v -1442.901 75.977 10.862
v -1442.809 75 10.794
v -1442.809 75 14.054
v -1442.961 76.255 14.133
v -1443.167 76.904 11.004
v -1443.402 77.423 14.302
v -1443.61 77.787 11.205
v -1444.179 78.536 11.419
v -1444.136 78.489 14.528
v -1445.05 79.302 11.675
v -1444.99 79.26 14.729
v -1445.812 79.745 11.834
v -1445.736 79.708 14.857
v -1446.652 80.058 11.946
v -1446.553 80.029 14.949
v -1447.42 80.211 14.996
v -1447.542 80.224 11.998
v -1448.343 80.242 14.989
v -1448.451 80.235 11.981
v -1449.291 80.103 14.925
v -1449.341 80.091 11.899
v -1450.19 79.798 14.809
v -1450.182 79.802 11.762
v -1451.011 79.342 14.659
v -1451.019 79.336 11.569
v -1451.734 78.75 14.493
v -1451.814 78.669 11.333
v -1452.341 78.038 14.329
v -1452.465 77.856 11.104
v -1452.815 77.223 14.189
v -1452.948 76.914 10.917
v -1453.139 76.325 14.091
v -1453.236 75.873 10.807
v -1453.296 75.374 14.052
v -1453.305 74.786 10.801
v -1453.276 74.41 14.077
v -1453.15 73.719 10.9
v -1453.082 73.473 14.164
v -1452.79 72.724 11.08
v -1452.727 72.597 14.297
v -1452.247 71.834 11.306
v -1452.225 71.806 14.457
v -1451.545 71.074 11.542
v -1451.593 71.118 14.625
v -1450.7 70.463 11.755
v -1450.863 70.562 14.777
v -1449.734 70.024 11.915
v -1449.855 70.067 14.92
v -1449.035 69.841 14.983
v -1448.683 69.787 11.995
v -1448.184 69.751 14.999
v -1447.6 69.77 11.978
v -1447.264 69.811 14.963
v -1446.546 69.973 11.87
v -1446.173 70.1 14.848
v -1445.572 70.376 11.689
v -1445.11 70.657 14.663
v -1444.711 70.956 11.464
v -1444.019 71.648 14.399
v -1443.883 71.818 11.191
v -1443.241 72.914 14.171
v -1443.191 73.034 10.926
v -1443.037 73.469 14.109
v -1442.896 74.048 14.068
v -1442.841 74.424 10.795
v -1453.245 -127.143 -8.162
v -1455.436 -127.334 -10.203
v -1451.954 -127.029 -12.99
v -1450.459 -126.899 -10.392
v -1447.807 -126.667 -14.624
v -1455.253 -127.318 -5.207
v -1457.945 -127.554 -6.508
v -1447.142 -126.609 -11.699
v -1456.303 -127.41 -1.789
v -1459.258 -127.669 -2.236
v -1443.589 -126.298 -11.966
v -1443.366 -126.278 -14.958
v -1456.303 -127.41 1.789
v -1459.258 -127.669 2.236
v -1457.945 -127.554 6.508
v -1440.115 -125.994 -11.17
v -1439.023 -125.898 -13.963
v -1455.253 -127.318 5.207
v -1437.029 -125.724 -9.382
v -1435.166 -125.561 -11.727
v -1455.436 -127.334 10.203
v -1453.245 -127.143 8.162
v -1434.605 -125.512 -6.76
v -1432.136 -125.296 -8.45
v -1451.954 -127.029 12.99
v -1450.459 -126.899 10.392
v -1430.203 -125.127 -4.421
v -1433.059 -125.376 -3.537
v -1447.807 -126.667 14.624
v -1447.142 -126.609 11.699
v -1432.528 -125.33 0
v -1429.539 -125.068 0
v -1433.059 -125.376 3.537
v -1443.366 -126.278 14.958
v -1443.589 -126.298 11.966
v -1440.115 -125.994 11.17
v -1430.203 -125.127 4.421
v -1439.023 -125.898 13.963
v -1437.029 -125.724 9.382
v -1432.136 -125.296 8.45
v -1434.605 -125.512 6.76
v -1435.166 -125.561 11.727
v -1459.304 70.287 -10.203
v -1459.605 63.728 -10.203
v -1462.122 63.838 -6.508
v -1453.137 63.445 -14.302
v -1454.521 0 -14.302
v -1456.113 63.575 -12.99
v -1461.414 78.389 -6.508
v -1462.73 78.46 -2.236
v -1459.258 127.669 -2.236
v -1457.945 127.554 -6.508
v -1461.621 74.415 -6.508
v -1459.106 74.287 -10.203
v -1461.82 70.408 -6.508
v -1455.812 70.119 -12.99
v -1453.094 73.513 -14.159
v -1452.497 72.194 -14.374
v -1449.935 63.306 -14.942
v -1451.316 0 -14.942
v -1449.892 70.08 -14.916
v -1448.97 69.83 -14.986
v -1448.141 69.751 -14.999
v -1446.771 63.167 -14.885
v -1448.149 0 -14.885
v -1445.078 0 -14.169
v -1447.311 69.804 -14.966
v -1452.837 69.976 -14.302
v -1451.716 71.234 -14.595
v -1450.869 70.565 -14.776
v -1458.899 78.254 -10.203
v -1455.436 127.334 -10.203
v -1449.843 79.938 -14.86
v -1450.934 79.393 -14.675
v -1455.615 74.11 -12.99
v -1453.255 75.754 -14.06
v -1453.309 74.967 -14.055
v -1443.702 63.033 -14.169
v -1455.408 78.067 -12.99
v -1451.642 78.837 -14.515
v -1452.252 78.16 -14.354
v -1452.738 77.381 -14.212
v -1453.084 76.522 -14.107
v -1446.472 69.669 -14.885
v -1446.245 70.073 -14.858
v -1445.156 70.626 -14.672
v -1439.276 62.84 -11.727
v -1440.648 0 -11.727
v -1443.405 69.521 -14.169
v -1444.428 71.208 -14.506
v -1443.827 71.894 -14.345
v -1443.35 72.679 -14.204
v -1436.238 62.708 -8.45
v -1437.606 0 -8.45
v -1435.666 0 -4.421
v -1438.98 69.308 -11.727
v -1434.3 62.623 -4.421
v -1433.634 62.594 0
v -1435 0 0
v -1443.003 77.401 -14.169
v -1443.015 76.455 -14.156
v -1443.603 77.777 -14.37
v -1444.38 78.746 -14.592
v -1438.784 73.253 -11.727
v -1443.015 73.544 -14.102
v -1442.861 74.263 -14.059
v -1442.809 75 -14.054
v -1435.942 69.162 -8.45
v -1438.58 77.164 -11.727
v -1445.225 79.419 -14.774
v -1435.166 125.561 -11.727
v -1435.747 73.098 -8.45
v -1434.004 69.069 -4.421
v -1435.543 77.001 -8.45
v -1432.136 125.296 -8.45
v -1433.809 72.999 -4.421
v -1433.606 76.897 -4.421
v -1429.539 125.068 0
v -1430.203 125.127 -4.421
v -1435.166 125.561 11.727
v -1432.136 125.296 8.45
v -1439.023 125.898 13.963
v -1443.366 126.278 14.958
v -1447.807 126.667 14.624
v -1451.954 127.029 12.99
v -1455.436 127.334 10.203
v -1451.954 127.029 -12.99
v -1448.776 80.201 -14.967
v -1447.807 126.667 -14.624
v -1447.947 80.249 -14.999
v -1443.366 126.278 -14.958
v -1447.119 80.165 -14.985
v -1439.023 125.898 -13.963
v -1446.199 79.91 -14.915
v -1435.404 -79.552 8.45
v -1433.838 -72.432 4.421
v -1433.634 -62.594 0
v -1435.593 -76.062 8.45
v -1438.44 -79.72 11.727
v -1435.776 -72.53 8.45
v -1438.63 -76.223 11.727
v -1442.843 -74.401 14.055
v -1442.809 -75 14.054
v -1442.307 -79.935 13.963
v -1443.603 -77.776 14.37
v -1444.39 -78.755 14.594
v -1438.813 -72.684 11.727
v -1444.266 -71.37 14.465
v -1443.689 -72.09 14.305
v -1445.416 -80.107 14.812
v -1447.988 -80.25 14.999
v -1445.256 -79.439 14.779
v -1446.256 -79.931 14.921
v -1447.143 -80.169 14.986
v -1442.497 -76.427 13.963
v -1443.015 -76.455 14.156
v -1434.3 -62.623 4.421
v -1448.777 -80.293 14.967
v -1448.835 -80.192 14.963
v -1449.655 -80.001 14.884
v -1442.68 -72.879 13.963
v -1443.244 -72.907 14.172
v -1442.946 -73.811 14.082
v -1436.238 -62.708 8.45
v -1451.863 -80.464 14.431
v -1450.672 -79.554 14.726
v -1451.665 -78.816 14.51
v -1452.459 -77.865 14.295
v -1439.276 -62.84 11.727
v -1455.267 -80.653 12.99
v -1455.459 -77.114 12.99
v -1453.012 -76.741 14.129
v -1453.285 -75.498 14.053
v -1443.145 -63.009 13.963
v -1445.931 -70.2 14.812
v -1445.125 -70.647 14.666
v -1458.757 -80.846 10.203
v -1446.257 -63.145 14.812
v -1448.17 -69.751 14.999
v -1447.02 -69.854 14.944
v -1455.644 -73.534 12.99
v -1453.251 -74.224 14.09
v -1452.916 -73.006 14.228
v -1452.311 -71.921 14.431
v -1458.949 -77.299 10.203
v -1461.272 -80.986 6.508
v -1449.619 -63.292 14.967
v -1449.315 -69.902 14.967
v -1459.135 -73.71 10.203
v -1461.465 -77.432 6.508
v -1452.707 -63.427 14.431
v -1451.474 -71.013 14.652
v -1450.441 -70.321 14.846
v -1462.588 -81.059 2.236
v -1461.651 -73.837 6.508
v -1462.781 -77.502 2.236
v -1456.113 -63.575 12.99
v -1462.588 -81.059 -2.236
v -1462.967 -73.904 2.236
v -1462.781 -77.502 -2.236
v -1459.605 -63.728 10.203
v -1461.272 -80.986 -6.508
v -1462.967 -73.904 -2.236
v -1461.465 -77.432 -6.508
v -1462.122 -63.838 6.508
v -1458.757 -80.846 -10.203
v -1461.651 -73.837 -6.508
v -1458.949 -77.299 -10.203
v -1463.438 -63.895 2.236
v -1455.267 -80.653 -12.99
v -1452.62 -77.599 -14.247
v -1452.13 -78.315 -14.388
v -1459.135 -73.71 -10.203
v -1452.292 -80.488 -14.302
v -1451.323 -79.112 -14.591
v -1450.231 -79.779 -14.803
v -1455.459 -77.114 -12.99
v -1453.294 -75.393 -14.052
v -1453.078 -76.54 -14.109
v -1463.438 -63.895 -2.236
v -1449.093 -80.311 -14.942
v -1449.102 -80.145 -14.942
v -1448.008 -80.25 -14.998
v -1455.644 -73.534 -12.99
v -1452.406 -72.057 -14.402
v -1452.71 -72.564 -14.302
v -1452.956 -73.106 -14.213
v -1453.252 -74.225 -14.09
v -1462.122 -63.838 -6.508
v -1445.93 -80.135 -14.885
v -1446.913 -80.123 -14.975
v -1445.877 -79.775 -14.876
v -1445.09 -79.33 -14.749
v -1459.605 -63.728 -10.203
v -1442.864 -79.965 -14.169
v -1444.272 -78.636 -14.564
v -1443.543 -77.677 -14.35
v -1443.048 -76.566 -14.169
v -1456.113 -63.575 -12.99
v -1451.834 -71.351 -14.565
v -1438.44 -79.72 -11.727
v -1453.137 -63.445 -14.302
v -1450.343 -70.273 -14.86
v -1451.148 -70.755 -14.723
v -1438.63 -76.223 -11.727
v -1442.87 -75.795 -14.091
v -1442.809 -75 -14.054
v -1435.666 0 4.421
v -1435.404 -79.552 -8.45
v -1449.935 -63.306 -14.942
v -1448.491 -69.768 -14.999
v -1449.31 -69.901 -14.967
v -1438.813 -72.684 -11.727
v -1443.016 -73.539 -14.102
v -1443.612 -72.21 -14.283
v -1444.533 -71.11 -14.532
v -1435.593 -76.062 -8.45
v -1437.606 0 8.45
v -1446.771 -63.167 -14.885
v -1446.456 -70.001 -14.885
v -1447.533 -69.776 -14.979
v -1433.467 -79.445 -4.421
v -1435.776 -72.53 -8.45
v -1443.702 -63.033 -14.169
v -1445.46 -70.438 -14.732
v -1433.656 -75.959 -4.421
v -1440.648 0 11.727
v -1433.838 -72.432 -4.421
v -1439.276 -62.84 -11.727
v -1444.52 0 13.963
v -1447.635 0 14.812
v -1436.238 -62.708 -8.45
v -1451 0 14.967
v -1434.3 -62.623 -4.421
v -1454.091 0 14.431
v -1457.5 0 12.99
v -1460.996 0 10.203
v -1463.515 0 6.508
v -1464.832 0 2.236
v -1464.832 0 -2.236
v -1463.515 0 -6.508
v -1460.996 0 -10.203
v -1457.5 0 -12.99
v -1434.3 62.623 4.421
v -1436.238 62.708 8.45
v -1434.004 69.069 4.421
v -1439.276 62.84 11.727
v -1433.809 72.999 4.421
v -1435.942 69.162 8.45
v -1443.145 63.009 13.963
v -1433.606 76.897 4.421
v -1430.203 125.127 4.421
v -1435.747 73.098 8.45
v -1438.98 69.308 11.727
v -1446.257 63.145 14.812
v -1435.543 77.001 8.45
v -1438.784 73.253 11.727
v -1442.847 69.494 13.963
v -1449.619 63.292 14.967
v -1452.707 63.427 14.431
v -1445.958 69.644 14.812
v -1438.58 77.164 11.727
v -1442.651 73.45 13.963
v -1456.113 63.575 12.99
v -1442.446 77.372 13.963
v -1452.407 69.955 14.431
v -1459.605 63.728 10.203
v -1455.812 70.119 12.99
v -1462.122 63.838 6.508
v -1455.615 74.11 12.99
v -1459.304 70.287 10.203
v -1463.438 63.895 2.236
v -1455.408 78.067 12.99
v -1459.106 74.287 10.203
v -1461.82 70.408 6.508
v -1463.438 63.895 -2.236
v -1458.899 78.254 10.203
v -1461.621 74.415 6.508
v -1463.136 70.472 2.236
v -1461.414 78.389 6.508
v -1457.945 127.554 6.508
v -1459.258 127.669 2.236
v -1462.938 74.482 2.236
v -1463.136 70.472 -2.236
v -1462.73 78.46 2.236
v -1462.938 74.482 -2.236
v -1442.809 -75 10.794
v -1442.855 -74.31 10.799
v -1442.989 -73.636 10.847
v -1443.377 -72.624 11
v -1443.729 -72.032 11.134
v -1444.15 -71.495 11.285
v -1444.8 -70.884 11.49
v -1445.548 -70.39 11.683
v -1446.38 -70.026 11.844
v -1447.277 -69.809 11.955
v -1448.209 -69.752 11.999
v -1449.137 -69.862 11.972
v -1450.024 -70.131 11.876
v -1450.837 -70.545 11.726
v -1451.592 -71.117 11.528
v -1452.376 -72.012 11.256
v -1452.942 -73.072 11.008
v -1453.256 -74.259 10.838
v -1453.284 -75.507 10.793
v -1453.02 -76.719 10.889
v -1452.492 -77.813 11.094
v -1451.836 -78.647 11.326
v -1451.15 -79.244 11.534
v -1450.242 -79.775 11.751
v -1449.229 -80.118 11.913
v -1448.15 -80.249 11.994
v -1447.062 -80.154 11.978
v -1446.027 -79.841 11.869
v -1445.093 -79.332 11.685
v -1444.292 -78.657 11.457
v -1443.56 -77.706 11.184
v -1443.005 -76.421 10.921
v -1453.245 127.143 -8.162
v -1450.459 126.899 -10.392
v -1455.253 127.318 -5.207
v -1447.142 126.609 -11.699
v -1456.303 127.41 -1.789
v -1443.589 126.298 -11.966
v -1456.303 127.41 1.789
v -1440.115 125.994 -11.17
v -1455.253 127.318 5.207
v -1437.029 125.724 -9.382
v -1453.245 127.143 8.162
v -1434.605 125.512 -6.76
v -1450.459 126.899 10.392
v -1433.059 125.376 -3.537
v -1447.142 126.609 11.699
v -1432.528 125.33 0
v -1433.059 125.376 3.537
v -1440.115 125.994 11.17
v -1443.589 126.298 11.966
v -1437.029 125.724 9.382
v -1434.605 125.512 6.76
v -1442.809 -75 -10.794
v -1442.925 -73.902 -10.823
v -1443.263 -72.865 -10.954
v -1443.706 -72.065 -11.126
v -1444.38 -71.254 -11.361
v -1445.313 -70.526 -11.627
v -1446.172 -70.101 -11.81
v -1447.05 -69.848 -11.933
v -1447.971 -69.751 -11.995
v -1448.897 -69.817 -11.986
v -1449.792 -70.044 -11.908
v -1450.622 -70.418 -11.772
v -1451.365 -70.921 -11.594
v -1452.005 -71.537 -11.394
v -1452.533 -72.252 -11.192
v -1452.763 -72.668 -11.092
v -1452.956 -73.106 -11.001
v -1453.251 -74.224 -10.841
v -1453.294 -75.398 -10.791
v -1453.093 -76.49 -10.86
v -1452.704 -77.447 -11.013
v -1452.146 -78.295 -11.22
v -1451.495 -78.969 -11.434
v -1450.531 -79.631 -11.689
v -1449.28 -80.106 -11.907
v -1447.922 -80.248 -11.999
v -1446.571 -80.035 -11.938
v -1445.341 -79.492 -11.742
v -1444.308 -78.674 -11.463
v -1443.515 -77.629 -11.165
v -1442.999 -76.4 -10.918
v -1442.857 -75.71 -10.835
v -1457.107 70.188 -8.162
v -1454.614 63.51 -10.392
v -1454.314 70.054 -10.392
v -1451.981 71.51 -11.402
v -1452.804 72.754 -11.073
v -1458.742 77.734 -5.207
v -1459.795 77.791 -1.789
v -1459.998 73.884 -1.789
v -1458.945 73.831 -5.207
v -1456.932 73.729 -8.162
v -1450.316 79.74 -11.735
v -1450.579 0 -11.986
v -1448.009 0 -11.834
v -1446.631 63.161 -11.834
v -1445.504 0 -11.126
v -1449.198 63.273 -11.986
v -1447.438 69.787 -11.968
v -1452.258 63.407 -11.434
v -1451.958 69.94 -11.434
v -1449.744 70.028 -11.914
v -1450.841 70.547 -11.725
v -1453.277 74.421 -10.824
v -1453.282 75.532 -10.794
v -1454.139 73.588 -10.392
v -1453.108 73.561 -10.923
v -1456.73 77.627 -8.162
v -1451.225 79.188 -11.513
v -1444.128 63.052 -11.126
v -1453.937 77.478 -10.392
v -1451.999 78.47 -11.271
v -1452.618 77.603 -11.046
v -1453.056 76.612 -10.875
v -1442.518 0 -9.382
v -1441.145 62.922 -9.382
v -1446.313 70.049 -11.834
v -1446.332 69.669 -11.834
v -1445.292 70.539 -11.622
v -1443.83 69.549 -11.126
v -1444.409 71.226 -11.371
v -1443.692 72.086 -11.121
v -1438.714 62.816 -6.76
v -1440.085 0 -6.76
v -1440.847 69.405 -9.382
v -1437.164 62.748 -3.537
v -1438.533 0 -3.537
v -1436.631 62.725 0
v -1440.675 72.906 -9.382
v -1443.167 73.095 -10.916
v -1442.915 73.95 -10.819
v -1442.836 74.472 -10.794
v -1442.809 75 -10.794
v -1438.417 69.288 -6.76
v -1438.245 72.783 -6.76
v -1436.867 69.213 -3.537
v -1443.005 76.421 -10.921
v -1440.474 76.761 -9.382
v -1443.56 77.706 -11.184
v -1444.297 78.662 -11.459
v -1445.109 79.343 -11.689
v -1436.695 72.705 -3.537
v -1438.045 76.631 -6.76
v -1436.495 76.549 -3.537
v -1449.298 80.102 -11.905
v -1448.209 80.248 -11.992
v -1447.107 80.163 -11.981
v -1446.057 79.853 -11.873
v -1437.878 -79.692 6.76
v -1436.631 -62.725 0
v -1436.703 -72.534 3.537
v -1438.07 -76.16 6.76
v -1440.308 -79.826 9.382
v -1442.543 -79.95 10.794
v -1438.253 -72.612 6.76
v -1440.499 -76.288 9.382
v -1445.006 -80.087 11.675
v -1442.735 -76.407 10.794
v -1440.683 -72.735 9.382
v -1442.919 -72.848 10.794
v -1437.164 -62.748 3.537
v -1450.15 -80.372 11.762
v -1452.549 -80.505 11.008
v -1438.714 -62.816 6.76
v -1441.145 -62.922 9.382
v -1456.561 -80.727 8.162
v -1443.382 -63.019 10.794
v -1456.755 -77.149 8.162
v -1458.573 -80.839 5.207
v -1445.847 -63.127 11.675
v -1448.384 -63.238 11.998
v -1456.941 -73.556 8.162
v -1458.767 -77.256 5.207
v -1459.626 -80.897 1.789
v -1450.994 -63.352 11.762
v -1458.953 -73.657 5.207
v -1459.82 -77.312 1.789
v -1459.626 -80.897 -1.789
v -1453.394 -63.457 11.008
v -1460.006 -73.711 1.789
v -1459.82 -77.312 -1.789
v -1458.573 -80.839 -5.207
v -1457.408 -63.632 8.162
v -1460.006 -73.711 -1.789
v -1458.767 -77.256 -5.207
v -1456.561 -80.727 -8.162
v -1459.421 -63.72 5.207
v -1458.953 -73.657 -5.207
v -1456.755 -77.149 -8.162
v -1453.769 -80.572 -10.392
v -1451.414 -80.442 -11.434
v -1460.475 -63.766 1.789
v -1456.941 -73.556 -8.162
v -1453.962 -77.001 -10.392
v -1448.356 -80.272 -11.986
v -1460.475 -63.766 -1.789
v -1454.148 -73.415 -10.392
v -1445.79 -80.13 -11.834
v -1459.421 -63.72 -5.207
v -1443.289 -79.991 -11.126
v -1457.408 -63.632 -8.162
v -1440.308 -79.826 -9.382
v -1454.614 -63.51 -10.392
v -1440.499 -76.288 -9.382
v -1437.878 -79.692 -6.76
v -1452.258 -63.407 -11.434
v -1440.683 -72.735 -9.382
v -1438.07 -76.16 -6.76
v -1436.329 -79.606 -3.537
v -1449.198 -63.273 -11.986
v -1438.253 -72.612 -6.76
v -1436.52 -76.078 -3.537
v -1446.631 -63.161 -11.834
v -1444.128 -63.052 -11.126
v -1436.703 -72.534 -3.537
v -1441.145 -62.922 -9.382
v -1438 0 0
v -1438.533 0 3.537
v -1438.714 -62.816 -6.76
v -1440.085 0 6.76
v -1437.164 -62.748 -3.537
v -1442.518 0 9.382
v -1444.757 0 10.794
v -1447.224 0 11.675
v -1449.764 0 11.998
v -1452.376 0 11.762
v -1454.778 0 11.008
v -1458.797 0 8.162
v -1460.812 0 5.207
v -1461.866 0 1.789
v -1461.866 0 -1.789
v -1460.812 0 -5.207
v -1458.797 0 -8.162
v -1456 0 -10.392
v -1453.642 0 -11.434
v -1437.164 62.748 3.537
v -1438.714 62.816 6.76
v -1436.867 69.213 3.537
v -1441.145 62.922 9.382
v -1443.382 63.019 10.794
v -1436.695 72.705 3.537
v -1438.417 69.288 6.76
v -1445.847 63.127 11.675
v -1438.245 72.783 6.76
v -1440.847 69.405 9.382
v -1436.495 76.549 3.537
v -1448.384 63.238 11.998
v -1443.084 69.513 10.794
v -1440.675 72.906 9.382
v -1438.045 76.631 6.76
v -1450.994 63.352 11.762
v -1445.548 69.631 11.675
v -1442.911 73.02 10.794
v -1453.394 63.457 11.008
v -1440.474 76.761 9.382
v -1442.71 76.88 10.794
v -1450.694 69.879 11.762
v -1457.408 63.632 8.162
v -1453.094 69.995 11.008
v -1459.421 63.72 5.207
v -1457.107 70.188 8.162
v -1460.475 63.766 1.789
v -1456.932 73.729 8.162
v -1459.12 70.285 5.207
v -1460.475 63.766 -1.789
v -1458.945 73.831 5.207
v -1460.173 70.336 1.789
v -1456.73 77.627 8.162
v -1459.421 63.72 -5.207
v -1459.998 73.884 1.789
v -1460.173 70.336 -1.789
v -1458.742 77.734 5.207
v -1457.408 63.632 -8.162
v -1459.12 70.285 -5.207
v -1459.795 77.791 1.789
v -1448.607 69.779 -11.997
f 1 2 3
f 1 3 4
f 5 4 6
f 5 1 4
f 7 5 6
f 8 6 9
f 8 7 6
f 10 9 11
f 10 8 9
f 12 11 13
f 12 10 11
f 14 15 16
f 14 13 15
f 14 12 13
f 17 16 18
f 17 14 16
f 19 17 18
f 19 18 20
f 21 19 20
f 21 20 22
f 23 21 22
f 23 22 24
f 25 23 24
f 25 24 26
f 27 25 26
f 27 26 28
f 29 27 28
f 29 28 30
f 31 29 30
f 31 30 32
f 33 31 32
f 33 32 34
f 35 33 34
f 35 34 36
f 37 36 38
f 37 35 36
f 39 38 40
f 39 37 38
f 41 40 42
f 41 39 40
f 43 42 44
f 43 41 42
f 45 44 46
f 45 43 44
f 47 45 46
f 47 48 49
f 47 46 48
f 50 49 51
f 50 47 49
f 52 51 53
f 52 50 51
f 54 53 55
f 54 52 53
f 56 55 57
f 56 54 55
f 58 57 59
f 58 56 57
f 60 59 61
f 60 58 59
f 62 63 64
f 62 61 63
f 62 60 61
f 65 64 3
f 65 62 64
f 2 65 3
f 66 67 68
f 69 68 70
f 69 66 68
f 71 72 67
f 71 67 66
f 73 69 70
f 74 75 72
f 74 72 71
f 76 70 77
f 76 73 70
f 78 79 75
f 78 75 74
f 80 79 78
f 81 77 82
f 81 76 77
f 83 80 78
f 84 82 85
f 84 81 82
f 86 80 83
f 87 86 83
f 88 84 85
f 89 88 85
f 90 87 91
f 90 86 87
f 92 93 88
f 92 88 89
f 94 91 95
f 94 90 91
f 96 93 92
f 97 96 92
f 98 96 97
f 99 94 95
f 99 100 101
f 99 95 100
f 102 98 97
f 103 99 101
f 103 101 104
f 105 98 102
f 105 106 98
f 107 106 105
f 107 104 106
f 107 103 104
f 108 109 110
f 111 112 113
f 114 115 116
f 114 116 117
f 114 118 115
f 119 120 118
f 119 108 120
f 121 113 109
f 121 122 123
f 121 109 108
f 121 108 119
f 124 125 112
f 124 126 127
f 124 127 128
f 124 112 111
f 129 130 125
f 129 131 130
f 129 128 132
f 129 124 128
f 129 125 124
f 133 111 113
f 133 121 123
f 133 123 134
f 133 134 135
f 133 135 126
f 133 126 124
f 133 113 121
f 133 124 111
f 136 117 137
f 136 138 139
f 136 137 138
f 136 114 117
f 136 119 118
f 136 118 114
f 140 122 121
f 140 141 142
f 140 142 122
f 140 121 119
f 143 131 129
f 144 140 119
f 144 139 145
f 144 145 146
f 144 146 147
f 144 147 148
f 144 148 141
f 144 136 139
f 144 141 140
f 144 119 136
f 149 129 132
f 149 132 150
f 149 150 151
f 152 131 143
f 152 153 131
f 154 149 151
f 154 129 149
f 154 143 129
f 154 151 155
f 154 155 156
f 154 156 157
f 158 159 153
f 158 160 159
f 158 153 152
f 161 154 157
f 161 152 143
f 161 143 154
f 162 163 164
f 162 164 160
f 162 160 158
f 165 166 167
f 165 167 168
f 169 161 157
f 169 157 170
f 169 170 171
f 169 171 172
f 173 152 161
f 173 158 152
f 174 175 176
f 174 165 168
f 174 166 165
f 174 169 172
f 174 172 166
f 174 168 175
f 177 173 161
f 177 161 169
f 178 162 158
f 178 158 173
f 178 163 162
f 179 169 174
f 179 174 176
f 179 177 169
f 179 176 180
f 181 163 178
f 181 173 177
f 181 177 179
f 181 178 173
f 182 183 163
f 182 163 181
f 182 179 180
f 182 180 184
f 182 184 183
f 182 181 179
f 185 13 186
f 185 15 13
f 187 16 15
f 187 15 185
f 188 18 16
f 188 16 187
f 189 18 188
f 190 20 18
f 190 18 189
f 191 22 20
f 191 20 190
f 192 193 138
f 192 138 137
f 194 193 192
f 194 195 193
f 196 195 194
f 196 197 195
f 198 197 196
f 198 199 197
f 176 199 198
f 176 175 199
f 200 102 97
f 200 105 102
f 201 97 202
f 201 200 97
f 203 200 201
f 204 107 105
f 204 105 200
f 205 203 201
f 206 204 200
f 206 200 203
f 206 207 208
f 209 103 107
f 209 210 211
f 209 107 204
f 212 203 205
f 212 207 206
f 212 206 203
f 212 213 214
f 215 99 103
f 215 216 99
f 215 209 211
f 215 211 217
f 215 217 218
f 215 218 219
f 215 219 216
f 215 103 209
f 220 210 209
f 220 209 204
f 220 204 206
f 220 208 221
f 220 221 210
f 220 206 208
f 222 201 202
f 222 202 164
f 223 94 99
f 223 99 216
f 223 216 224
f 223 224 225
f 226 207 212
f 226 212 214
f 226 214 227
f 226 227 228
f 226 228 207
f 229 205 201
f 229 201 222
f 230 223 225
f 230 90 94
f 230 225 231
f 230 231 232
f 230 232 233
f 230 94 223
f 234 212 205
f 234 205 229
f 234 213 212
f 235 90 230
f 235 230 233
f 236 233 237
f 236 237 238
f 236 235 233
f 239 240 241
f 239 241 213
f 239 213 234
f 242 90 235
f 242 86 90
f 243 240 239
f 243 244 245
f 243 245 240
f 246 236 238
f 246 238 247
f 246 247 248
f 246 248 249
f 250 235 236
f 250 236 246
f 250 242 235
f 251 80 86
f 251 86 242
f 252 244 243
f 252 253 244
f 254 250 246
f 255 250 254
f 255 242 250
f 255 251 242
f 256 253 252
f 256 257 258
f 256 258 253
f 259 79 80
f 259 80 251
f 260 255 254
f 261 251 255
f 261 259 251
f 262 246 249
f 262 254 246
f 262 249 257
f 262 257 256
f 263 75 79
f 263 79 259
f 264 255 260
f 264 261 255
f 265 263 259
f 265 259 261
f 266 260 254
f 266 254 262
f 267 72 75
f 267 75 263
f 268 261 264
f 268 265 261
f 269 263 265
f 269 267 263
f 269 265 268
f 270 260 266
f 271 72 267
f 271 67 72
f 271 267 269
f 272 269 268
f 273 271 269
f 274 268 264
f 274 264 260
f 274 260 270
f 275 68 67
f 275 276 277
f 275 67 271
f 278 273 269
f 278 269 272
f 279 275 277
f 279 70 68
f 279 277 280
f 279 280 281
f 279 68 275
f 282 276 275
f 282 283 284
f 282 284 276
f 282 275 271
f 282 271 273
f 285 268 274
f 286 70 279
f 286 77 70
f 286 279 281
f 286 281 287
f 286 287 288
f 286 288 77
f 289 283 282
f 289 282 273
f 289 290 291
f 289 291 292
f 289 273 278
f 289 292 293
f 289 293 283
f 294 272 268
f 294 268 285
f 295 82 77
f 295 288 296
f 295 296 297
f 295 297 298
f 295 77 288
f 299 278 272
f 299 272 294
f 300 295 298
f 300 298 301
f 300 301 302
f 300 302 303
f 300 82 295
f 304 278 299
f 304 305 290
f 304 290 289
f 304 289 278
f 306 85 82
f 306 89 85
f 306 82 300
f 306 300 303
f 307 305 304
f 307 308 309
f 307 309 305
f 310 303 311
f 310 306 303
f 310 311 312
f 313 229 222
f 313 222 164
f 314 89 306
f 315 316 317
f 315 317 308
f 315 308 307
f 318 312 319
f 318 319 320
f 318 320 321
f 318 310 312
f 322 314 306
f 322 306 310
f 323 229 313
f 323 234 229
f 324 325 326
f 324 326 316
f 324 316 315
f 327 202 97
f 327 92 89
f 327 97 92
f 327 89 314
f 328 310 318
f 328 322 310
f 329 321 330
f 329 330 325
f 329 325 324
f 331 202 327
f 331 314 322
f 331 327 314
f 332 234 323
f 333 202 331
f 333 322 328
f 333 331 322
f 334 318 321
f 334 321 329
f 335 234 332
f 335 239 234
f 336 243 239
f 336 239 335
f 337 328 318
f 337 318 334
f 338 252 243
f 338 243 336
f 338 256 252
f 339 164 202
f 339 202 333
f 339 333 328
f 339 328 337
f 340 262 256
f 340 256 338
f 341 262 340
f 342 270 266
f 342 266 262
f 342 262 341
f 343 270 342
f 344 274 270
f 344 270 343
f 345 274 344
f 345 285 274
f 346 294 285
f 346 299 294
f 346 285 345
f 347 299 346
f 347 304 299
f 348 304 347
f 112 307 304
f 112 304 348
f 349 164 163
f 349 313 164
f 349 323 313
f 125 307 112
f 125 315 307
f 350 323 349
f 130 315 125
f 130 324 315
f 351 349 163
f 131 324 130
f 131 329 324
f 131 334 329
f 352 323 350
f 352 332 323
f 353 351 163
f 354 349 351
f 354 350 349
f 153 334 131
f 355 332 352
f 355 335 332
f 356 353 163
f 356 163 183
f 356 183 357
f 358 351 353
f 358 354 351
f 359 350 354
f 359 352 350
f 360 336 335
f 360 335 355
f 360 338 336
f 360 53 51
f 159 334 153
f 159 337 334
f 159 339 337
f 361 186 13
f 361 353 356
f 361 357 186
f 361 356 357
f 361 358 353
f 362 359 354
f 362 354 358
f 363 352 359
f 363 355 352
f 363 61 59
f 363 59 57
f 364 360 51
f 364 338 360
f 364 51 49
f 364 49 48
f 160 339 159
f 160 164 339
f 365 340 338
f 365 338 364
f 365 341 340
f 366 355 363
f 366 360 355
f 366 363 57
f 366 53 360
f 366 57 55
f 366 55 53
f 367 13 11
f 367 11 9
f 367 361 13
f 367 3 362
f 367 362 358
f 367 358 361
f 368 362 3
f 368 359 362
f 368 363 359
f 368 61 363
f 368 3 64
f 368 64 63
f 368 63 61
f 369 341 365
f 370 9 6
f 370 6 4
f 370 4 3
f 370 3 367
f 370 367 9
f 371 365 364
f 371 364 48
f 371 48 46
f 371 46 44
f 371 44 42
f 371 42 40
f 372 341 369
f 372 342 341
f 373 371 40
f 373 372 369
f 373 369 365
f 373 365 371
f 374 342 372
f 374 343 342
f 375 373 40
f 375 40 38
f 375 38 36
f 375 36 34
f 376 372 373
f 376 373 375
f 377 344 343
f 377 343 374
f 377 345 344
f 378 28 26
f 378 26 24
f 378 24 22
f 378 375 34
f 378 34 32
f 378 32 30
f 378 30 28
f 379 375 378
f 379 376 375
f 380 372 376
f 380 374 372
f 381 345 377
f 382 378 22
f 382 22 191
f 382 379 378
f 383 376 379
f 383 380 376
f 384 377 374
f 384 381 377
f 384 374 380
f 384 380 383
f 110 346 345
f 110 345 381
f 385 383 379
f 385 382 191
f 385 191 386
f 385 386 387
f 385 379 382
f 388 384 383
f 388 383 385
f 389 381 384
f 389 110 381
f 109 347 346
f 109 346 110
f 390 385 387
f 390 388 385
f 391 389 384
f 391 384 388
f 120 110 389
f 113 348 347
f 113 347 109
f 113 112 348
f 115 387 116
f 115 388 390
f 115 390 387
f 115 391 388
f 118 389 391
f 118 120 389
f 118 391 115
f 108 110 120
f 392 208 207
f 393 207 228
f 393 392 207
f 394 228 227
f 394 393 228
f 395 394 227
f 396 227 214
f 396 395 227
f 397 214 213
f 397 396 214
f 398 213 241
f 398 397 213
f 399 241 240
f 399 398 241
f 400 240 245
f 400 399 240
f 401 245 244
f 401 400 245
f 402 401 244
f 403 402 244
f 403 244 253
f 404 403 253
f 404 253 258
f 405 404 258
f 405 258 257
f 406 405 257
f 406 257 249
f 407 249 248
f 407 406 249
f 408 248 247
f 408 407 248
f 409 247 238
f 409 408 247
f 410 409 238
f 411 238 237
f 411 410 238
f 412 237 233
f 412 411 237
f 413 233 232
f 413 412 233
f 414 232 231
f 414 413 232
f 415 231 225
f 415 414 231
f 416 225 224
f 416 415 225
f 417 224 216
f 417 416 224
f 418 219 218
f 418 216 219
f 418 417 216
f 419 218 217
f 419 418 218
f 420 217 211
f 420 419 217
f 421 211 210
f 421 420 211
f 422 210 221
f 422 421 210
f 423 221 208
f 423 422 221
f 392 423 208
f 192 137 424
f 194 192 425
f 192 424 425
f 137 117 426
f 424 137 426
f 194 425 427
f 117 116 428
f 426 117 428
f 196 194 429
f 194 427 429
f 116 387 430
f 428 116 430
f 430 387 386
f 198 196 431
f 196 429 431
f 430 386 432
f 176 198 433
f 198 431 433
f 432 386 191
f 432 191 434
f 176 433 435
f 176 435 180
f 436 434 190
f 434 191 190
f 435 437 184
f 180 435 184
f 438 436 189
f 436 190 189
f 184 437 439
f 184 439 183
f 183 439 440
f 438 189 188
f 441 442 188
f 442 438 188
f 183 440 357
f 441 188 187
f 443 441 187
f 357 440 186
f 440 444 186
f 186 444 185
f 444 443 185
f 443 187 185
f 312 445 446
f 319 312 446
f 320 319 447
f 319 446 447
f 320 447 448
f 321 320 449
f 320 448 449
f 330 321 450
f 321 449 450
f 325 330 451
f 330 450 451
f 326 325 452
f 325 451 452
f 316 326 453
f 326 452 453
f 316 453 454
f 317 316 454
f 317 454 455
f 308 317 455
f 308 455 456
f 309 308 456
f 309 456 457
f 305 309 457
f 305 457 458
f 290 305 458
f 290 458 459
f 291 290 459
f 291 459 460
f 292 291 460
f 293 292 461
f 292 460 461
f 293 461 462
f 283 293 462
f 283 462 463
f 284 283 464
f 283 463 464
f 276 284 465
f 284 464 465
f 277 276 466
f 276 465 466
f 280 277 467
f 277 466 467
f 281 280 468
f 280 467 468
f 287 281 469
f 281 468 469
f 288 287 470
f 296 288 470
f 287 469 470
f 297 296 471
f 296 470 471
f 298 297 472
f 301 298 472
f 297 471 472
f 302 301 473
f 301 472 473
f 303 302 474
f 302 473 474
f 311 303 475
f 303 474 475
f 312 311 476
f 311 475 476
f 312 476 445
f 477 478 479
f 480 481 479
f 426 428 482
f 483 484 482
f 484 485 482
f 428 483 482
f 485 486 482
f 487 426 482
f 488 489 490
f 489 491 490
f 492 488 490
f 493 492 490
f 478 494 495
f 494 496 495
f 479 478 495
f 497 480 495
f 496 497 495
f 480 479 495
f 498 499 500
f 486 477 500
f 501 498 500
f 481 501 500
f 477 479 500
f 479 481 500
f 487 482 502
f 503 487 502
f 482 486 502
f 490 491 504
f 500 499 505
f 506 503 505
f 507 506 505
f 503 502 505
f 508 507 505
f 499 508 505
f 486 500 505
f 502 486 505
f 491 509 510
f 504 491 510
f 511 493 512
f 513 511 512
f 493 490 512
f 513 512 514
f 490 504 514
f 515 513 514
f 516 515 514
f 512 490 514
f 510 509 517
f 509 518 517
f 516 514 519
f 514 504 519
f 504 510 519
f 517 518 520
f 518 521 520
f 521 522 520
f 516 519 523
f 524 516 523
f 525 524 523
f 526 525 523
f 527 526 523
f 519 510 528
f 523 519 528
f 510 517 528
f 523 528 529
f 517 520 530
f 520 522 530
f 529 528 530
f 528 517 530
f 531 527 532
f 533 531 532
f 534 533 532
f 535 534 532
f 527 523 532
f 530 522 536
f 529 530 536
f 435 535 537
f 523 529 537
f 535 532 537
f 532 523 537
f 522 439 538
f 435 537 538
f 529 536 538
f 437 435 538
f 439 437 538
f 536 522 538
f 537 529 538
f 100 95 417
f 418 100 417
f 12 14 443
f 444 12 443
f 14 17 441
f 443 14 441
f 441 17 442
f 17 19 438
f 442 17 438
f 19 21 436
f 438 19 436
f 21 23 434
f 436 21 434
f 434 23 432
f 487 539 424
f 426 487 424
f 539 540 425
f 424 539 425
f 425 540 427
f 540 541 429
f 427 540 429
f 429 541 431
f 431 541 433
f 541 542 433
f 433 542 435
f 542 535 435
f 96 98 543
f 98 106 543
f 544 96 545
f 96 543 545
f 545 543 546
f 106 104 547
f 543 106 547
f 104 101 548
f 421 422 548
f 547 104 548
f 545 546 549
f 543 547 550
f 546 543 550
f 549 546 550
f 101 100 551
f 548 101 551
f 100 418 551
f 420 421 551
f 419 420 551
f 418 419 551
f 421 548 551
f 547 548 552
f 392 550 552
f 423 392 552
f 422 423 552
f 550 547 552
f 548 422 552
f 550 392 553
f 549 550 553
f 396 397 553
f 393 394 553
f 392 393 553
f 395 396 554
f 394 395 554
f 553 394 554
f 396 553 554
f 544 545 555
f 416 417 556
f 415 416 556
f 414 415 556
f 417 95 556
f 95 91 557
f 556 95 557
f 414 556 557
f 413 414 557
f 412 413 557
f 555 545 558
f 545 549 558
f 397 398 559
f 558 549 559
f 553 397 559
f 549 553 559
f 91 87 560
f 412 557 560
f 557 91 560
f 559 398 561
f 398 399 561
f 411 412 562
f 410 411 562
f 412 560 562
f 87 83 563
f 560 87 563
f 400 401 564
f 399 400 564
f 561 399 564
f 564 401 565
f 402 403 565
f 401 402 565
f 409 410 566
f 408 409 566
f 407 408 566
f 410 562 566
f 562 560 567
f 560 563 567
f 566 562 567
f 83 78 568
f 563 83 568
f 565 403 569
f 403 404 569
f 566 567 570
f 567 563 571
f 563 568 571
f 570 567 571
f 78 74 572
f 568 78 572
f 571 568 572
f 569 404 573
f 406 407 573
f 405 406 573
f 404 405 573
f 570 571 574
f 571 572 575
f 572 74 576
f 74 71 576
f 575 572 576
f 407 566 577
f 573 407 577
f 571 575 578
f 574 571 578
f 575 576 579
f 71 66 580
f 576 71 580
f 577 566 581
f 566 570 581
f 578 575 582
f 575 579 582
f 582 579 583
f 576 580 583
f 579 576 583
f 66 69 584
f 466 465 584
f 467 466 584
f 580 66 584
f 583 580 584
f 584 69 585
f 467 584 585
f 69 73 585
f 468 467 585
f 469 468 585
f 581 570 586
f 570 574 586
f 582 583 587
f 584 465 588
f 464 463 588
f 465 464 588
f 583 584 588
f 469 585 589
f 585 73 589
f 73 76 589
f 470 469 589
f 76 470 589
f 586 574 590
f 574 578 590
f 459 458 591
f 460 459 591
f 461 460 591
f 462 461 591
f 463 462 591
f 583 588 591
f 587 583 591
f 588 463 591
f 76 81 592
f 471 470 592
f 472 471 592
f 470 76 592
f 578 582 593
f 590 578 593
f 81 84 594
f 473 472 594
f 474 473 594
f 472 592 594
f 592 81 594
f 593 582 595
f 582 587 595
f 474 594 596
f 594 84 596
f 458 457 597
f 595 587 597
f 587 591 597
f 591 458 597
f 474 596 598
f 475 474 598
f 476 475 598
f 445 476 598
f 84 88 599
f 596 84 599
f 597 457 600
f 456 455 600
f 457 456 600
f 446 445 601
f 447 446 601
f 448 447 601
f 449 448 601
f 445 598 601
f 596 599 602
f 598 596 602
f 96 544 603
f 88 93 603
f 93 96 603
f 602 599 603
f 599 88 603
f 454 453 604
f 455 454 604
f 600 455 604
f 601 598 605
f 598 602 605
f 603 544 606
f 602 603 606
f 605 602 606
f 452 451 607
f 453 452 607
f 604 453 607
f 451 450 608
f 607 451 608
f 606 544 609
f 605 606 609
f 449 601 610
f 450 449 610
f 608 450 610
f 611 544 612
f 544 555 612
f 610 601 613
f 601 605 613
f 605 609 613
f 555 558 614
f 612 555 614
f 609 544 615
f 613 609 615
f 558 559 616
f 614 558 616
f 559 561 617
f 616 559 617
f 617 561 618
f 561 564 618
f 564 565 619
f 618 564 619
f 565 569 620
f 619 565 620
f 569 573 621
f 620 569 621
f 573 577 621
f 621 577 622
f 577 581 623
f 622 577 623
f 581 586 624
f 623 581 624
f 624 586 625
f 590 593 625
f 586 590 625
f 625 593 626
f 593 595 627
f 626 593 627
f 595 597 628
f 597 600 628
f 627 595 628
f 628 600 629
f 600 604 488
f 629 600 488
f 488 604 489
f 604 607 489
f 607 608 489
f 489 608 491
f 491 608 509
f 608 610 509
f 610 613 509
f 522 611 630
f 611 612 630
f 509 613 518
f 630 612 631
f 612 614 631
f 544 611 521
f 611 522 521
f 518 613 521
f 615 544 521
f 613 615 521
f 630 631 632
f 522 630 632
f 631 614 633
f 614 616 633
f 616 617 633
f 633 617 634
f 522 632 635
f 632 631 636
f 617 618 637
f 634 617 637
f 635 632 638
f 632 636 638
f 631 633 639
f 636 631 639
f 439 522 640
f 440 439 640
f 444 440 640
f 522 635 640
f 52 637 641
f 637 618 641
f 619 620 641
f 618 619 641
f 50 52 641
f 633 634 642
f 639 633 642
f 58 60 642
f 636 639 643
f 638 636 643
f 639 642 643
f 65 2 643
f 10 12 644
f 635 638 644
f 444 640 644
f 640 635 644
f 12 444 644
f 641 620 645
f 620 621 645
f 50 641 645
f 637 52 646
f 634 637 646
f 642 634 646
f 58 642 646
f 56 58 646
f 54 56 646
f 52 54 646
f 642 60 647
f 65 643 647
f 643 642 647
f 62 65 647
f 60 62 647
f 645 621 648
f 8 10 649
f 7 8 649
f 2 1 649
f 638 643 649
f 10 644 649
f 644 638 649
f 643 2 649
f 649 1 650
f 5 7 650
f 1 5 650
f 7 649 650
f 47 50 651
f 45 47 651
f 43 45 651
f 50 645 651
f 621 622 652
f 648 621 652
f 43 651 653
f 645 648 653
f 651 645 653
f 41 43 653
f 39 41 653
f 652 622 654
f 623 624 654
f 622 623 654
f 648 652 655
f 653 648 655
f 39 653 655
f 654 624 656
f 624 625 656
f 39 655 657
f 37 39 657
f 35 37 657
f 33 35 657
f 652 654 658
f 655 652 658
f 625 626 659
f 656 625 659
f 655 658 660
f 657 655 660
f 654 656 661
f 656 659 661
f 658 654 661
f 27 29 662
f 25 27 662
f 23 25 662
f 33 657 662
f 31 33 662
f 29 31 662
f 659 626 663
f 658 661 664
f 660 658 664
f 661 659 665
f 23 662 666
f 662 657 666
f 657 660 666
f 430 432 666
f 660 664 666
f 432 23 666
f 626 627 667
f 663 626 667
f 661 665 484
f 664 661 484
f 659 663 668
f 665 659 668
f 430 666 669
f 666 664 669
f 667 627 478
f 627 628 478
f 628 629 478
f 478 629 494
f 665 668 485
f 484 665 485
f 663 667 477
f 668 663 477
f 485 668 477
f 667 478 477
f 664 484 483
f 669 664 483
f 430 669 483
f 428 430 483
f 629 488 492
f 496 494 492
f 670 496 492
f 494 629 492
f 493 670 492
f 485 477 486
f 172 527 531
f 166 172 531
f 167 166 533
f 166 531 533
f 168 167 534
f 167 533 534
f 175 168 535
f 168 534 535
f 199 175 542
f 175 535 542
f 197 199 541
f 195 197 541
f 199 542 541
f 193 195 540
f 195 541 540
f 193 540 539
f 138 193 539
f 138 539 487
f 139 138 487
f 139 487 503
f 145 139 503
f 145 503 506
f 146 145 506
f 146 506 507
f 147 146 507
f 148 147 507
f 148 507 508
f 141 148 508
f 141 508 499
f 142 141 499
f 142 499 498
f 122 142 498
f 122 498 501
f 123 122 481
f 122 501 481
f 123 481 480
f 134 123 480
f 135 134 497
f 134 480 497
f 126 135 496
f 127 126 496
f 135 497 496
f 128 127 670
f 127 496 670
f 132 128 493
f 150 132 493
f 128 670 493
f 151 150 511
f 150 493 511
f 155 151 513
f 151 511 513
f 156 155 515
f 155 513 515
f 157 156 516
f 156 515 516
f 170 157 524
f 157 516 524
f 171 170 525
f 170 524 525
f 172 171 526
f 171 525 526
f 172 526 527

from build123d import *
from build123d import SkipClean  # not in build123d's __all__

# Parameters (mm, degrees)
F0_R          = 15
F0_R_2        = 12
F1_ANGLE_BACK = 5
F1_ANGLE      = 10
F2_R          = 5.25
F3_DEPTH      = 15.001
F3_DEPTH_BACK = 15.001


with BuildPart() as f1:
    # F0 (on Front) → F1 (revolve)
    with BuildSketch(Plane.XZ, mode=Mode.PRIVATE) as f1_sk:
        with Locations((-1450, 0)):
            Circle(F0_R)
        with Locations((-1450, 0)):
            Circle(F0_R_2, mode=Mode.SUBTRACT)
    revolve(f1_sk.sketch.rotate(Axis((0, 0, 190.0846064091), (0, 0, -1)), -F1_ANGLE_BACK), axis=Axis((0, 0, 190.0846064091), (0, 0, -1)), revolution_arc=F1_ANGLE)

    # F2 (on Top) → F3 (cut, two sides)
    with BuildSketch(Plane.XY) as f3_sk:
        with Locations((-1448.0590457575, -75)):
            Circle(F2_R)
        with Locations((-1448.0590457575, 75)):
            Circle(F2_R)
    with SkipClean():  # cleaning this boolean's faces spoils the solid; the shape is the same uncleaned
        extrude(amount=-F3_DEPTH, mode=Mode.SUBTRACT)
        extrude(f3_sk.sketch, amount=F3_DEPTH_BACK, mode=Mode.SUBTRACT)


solid = f1.part
